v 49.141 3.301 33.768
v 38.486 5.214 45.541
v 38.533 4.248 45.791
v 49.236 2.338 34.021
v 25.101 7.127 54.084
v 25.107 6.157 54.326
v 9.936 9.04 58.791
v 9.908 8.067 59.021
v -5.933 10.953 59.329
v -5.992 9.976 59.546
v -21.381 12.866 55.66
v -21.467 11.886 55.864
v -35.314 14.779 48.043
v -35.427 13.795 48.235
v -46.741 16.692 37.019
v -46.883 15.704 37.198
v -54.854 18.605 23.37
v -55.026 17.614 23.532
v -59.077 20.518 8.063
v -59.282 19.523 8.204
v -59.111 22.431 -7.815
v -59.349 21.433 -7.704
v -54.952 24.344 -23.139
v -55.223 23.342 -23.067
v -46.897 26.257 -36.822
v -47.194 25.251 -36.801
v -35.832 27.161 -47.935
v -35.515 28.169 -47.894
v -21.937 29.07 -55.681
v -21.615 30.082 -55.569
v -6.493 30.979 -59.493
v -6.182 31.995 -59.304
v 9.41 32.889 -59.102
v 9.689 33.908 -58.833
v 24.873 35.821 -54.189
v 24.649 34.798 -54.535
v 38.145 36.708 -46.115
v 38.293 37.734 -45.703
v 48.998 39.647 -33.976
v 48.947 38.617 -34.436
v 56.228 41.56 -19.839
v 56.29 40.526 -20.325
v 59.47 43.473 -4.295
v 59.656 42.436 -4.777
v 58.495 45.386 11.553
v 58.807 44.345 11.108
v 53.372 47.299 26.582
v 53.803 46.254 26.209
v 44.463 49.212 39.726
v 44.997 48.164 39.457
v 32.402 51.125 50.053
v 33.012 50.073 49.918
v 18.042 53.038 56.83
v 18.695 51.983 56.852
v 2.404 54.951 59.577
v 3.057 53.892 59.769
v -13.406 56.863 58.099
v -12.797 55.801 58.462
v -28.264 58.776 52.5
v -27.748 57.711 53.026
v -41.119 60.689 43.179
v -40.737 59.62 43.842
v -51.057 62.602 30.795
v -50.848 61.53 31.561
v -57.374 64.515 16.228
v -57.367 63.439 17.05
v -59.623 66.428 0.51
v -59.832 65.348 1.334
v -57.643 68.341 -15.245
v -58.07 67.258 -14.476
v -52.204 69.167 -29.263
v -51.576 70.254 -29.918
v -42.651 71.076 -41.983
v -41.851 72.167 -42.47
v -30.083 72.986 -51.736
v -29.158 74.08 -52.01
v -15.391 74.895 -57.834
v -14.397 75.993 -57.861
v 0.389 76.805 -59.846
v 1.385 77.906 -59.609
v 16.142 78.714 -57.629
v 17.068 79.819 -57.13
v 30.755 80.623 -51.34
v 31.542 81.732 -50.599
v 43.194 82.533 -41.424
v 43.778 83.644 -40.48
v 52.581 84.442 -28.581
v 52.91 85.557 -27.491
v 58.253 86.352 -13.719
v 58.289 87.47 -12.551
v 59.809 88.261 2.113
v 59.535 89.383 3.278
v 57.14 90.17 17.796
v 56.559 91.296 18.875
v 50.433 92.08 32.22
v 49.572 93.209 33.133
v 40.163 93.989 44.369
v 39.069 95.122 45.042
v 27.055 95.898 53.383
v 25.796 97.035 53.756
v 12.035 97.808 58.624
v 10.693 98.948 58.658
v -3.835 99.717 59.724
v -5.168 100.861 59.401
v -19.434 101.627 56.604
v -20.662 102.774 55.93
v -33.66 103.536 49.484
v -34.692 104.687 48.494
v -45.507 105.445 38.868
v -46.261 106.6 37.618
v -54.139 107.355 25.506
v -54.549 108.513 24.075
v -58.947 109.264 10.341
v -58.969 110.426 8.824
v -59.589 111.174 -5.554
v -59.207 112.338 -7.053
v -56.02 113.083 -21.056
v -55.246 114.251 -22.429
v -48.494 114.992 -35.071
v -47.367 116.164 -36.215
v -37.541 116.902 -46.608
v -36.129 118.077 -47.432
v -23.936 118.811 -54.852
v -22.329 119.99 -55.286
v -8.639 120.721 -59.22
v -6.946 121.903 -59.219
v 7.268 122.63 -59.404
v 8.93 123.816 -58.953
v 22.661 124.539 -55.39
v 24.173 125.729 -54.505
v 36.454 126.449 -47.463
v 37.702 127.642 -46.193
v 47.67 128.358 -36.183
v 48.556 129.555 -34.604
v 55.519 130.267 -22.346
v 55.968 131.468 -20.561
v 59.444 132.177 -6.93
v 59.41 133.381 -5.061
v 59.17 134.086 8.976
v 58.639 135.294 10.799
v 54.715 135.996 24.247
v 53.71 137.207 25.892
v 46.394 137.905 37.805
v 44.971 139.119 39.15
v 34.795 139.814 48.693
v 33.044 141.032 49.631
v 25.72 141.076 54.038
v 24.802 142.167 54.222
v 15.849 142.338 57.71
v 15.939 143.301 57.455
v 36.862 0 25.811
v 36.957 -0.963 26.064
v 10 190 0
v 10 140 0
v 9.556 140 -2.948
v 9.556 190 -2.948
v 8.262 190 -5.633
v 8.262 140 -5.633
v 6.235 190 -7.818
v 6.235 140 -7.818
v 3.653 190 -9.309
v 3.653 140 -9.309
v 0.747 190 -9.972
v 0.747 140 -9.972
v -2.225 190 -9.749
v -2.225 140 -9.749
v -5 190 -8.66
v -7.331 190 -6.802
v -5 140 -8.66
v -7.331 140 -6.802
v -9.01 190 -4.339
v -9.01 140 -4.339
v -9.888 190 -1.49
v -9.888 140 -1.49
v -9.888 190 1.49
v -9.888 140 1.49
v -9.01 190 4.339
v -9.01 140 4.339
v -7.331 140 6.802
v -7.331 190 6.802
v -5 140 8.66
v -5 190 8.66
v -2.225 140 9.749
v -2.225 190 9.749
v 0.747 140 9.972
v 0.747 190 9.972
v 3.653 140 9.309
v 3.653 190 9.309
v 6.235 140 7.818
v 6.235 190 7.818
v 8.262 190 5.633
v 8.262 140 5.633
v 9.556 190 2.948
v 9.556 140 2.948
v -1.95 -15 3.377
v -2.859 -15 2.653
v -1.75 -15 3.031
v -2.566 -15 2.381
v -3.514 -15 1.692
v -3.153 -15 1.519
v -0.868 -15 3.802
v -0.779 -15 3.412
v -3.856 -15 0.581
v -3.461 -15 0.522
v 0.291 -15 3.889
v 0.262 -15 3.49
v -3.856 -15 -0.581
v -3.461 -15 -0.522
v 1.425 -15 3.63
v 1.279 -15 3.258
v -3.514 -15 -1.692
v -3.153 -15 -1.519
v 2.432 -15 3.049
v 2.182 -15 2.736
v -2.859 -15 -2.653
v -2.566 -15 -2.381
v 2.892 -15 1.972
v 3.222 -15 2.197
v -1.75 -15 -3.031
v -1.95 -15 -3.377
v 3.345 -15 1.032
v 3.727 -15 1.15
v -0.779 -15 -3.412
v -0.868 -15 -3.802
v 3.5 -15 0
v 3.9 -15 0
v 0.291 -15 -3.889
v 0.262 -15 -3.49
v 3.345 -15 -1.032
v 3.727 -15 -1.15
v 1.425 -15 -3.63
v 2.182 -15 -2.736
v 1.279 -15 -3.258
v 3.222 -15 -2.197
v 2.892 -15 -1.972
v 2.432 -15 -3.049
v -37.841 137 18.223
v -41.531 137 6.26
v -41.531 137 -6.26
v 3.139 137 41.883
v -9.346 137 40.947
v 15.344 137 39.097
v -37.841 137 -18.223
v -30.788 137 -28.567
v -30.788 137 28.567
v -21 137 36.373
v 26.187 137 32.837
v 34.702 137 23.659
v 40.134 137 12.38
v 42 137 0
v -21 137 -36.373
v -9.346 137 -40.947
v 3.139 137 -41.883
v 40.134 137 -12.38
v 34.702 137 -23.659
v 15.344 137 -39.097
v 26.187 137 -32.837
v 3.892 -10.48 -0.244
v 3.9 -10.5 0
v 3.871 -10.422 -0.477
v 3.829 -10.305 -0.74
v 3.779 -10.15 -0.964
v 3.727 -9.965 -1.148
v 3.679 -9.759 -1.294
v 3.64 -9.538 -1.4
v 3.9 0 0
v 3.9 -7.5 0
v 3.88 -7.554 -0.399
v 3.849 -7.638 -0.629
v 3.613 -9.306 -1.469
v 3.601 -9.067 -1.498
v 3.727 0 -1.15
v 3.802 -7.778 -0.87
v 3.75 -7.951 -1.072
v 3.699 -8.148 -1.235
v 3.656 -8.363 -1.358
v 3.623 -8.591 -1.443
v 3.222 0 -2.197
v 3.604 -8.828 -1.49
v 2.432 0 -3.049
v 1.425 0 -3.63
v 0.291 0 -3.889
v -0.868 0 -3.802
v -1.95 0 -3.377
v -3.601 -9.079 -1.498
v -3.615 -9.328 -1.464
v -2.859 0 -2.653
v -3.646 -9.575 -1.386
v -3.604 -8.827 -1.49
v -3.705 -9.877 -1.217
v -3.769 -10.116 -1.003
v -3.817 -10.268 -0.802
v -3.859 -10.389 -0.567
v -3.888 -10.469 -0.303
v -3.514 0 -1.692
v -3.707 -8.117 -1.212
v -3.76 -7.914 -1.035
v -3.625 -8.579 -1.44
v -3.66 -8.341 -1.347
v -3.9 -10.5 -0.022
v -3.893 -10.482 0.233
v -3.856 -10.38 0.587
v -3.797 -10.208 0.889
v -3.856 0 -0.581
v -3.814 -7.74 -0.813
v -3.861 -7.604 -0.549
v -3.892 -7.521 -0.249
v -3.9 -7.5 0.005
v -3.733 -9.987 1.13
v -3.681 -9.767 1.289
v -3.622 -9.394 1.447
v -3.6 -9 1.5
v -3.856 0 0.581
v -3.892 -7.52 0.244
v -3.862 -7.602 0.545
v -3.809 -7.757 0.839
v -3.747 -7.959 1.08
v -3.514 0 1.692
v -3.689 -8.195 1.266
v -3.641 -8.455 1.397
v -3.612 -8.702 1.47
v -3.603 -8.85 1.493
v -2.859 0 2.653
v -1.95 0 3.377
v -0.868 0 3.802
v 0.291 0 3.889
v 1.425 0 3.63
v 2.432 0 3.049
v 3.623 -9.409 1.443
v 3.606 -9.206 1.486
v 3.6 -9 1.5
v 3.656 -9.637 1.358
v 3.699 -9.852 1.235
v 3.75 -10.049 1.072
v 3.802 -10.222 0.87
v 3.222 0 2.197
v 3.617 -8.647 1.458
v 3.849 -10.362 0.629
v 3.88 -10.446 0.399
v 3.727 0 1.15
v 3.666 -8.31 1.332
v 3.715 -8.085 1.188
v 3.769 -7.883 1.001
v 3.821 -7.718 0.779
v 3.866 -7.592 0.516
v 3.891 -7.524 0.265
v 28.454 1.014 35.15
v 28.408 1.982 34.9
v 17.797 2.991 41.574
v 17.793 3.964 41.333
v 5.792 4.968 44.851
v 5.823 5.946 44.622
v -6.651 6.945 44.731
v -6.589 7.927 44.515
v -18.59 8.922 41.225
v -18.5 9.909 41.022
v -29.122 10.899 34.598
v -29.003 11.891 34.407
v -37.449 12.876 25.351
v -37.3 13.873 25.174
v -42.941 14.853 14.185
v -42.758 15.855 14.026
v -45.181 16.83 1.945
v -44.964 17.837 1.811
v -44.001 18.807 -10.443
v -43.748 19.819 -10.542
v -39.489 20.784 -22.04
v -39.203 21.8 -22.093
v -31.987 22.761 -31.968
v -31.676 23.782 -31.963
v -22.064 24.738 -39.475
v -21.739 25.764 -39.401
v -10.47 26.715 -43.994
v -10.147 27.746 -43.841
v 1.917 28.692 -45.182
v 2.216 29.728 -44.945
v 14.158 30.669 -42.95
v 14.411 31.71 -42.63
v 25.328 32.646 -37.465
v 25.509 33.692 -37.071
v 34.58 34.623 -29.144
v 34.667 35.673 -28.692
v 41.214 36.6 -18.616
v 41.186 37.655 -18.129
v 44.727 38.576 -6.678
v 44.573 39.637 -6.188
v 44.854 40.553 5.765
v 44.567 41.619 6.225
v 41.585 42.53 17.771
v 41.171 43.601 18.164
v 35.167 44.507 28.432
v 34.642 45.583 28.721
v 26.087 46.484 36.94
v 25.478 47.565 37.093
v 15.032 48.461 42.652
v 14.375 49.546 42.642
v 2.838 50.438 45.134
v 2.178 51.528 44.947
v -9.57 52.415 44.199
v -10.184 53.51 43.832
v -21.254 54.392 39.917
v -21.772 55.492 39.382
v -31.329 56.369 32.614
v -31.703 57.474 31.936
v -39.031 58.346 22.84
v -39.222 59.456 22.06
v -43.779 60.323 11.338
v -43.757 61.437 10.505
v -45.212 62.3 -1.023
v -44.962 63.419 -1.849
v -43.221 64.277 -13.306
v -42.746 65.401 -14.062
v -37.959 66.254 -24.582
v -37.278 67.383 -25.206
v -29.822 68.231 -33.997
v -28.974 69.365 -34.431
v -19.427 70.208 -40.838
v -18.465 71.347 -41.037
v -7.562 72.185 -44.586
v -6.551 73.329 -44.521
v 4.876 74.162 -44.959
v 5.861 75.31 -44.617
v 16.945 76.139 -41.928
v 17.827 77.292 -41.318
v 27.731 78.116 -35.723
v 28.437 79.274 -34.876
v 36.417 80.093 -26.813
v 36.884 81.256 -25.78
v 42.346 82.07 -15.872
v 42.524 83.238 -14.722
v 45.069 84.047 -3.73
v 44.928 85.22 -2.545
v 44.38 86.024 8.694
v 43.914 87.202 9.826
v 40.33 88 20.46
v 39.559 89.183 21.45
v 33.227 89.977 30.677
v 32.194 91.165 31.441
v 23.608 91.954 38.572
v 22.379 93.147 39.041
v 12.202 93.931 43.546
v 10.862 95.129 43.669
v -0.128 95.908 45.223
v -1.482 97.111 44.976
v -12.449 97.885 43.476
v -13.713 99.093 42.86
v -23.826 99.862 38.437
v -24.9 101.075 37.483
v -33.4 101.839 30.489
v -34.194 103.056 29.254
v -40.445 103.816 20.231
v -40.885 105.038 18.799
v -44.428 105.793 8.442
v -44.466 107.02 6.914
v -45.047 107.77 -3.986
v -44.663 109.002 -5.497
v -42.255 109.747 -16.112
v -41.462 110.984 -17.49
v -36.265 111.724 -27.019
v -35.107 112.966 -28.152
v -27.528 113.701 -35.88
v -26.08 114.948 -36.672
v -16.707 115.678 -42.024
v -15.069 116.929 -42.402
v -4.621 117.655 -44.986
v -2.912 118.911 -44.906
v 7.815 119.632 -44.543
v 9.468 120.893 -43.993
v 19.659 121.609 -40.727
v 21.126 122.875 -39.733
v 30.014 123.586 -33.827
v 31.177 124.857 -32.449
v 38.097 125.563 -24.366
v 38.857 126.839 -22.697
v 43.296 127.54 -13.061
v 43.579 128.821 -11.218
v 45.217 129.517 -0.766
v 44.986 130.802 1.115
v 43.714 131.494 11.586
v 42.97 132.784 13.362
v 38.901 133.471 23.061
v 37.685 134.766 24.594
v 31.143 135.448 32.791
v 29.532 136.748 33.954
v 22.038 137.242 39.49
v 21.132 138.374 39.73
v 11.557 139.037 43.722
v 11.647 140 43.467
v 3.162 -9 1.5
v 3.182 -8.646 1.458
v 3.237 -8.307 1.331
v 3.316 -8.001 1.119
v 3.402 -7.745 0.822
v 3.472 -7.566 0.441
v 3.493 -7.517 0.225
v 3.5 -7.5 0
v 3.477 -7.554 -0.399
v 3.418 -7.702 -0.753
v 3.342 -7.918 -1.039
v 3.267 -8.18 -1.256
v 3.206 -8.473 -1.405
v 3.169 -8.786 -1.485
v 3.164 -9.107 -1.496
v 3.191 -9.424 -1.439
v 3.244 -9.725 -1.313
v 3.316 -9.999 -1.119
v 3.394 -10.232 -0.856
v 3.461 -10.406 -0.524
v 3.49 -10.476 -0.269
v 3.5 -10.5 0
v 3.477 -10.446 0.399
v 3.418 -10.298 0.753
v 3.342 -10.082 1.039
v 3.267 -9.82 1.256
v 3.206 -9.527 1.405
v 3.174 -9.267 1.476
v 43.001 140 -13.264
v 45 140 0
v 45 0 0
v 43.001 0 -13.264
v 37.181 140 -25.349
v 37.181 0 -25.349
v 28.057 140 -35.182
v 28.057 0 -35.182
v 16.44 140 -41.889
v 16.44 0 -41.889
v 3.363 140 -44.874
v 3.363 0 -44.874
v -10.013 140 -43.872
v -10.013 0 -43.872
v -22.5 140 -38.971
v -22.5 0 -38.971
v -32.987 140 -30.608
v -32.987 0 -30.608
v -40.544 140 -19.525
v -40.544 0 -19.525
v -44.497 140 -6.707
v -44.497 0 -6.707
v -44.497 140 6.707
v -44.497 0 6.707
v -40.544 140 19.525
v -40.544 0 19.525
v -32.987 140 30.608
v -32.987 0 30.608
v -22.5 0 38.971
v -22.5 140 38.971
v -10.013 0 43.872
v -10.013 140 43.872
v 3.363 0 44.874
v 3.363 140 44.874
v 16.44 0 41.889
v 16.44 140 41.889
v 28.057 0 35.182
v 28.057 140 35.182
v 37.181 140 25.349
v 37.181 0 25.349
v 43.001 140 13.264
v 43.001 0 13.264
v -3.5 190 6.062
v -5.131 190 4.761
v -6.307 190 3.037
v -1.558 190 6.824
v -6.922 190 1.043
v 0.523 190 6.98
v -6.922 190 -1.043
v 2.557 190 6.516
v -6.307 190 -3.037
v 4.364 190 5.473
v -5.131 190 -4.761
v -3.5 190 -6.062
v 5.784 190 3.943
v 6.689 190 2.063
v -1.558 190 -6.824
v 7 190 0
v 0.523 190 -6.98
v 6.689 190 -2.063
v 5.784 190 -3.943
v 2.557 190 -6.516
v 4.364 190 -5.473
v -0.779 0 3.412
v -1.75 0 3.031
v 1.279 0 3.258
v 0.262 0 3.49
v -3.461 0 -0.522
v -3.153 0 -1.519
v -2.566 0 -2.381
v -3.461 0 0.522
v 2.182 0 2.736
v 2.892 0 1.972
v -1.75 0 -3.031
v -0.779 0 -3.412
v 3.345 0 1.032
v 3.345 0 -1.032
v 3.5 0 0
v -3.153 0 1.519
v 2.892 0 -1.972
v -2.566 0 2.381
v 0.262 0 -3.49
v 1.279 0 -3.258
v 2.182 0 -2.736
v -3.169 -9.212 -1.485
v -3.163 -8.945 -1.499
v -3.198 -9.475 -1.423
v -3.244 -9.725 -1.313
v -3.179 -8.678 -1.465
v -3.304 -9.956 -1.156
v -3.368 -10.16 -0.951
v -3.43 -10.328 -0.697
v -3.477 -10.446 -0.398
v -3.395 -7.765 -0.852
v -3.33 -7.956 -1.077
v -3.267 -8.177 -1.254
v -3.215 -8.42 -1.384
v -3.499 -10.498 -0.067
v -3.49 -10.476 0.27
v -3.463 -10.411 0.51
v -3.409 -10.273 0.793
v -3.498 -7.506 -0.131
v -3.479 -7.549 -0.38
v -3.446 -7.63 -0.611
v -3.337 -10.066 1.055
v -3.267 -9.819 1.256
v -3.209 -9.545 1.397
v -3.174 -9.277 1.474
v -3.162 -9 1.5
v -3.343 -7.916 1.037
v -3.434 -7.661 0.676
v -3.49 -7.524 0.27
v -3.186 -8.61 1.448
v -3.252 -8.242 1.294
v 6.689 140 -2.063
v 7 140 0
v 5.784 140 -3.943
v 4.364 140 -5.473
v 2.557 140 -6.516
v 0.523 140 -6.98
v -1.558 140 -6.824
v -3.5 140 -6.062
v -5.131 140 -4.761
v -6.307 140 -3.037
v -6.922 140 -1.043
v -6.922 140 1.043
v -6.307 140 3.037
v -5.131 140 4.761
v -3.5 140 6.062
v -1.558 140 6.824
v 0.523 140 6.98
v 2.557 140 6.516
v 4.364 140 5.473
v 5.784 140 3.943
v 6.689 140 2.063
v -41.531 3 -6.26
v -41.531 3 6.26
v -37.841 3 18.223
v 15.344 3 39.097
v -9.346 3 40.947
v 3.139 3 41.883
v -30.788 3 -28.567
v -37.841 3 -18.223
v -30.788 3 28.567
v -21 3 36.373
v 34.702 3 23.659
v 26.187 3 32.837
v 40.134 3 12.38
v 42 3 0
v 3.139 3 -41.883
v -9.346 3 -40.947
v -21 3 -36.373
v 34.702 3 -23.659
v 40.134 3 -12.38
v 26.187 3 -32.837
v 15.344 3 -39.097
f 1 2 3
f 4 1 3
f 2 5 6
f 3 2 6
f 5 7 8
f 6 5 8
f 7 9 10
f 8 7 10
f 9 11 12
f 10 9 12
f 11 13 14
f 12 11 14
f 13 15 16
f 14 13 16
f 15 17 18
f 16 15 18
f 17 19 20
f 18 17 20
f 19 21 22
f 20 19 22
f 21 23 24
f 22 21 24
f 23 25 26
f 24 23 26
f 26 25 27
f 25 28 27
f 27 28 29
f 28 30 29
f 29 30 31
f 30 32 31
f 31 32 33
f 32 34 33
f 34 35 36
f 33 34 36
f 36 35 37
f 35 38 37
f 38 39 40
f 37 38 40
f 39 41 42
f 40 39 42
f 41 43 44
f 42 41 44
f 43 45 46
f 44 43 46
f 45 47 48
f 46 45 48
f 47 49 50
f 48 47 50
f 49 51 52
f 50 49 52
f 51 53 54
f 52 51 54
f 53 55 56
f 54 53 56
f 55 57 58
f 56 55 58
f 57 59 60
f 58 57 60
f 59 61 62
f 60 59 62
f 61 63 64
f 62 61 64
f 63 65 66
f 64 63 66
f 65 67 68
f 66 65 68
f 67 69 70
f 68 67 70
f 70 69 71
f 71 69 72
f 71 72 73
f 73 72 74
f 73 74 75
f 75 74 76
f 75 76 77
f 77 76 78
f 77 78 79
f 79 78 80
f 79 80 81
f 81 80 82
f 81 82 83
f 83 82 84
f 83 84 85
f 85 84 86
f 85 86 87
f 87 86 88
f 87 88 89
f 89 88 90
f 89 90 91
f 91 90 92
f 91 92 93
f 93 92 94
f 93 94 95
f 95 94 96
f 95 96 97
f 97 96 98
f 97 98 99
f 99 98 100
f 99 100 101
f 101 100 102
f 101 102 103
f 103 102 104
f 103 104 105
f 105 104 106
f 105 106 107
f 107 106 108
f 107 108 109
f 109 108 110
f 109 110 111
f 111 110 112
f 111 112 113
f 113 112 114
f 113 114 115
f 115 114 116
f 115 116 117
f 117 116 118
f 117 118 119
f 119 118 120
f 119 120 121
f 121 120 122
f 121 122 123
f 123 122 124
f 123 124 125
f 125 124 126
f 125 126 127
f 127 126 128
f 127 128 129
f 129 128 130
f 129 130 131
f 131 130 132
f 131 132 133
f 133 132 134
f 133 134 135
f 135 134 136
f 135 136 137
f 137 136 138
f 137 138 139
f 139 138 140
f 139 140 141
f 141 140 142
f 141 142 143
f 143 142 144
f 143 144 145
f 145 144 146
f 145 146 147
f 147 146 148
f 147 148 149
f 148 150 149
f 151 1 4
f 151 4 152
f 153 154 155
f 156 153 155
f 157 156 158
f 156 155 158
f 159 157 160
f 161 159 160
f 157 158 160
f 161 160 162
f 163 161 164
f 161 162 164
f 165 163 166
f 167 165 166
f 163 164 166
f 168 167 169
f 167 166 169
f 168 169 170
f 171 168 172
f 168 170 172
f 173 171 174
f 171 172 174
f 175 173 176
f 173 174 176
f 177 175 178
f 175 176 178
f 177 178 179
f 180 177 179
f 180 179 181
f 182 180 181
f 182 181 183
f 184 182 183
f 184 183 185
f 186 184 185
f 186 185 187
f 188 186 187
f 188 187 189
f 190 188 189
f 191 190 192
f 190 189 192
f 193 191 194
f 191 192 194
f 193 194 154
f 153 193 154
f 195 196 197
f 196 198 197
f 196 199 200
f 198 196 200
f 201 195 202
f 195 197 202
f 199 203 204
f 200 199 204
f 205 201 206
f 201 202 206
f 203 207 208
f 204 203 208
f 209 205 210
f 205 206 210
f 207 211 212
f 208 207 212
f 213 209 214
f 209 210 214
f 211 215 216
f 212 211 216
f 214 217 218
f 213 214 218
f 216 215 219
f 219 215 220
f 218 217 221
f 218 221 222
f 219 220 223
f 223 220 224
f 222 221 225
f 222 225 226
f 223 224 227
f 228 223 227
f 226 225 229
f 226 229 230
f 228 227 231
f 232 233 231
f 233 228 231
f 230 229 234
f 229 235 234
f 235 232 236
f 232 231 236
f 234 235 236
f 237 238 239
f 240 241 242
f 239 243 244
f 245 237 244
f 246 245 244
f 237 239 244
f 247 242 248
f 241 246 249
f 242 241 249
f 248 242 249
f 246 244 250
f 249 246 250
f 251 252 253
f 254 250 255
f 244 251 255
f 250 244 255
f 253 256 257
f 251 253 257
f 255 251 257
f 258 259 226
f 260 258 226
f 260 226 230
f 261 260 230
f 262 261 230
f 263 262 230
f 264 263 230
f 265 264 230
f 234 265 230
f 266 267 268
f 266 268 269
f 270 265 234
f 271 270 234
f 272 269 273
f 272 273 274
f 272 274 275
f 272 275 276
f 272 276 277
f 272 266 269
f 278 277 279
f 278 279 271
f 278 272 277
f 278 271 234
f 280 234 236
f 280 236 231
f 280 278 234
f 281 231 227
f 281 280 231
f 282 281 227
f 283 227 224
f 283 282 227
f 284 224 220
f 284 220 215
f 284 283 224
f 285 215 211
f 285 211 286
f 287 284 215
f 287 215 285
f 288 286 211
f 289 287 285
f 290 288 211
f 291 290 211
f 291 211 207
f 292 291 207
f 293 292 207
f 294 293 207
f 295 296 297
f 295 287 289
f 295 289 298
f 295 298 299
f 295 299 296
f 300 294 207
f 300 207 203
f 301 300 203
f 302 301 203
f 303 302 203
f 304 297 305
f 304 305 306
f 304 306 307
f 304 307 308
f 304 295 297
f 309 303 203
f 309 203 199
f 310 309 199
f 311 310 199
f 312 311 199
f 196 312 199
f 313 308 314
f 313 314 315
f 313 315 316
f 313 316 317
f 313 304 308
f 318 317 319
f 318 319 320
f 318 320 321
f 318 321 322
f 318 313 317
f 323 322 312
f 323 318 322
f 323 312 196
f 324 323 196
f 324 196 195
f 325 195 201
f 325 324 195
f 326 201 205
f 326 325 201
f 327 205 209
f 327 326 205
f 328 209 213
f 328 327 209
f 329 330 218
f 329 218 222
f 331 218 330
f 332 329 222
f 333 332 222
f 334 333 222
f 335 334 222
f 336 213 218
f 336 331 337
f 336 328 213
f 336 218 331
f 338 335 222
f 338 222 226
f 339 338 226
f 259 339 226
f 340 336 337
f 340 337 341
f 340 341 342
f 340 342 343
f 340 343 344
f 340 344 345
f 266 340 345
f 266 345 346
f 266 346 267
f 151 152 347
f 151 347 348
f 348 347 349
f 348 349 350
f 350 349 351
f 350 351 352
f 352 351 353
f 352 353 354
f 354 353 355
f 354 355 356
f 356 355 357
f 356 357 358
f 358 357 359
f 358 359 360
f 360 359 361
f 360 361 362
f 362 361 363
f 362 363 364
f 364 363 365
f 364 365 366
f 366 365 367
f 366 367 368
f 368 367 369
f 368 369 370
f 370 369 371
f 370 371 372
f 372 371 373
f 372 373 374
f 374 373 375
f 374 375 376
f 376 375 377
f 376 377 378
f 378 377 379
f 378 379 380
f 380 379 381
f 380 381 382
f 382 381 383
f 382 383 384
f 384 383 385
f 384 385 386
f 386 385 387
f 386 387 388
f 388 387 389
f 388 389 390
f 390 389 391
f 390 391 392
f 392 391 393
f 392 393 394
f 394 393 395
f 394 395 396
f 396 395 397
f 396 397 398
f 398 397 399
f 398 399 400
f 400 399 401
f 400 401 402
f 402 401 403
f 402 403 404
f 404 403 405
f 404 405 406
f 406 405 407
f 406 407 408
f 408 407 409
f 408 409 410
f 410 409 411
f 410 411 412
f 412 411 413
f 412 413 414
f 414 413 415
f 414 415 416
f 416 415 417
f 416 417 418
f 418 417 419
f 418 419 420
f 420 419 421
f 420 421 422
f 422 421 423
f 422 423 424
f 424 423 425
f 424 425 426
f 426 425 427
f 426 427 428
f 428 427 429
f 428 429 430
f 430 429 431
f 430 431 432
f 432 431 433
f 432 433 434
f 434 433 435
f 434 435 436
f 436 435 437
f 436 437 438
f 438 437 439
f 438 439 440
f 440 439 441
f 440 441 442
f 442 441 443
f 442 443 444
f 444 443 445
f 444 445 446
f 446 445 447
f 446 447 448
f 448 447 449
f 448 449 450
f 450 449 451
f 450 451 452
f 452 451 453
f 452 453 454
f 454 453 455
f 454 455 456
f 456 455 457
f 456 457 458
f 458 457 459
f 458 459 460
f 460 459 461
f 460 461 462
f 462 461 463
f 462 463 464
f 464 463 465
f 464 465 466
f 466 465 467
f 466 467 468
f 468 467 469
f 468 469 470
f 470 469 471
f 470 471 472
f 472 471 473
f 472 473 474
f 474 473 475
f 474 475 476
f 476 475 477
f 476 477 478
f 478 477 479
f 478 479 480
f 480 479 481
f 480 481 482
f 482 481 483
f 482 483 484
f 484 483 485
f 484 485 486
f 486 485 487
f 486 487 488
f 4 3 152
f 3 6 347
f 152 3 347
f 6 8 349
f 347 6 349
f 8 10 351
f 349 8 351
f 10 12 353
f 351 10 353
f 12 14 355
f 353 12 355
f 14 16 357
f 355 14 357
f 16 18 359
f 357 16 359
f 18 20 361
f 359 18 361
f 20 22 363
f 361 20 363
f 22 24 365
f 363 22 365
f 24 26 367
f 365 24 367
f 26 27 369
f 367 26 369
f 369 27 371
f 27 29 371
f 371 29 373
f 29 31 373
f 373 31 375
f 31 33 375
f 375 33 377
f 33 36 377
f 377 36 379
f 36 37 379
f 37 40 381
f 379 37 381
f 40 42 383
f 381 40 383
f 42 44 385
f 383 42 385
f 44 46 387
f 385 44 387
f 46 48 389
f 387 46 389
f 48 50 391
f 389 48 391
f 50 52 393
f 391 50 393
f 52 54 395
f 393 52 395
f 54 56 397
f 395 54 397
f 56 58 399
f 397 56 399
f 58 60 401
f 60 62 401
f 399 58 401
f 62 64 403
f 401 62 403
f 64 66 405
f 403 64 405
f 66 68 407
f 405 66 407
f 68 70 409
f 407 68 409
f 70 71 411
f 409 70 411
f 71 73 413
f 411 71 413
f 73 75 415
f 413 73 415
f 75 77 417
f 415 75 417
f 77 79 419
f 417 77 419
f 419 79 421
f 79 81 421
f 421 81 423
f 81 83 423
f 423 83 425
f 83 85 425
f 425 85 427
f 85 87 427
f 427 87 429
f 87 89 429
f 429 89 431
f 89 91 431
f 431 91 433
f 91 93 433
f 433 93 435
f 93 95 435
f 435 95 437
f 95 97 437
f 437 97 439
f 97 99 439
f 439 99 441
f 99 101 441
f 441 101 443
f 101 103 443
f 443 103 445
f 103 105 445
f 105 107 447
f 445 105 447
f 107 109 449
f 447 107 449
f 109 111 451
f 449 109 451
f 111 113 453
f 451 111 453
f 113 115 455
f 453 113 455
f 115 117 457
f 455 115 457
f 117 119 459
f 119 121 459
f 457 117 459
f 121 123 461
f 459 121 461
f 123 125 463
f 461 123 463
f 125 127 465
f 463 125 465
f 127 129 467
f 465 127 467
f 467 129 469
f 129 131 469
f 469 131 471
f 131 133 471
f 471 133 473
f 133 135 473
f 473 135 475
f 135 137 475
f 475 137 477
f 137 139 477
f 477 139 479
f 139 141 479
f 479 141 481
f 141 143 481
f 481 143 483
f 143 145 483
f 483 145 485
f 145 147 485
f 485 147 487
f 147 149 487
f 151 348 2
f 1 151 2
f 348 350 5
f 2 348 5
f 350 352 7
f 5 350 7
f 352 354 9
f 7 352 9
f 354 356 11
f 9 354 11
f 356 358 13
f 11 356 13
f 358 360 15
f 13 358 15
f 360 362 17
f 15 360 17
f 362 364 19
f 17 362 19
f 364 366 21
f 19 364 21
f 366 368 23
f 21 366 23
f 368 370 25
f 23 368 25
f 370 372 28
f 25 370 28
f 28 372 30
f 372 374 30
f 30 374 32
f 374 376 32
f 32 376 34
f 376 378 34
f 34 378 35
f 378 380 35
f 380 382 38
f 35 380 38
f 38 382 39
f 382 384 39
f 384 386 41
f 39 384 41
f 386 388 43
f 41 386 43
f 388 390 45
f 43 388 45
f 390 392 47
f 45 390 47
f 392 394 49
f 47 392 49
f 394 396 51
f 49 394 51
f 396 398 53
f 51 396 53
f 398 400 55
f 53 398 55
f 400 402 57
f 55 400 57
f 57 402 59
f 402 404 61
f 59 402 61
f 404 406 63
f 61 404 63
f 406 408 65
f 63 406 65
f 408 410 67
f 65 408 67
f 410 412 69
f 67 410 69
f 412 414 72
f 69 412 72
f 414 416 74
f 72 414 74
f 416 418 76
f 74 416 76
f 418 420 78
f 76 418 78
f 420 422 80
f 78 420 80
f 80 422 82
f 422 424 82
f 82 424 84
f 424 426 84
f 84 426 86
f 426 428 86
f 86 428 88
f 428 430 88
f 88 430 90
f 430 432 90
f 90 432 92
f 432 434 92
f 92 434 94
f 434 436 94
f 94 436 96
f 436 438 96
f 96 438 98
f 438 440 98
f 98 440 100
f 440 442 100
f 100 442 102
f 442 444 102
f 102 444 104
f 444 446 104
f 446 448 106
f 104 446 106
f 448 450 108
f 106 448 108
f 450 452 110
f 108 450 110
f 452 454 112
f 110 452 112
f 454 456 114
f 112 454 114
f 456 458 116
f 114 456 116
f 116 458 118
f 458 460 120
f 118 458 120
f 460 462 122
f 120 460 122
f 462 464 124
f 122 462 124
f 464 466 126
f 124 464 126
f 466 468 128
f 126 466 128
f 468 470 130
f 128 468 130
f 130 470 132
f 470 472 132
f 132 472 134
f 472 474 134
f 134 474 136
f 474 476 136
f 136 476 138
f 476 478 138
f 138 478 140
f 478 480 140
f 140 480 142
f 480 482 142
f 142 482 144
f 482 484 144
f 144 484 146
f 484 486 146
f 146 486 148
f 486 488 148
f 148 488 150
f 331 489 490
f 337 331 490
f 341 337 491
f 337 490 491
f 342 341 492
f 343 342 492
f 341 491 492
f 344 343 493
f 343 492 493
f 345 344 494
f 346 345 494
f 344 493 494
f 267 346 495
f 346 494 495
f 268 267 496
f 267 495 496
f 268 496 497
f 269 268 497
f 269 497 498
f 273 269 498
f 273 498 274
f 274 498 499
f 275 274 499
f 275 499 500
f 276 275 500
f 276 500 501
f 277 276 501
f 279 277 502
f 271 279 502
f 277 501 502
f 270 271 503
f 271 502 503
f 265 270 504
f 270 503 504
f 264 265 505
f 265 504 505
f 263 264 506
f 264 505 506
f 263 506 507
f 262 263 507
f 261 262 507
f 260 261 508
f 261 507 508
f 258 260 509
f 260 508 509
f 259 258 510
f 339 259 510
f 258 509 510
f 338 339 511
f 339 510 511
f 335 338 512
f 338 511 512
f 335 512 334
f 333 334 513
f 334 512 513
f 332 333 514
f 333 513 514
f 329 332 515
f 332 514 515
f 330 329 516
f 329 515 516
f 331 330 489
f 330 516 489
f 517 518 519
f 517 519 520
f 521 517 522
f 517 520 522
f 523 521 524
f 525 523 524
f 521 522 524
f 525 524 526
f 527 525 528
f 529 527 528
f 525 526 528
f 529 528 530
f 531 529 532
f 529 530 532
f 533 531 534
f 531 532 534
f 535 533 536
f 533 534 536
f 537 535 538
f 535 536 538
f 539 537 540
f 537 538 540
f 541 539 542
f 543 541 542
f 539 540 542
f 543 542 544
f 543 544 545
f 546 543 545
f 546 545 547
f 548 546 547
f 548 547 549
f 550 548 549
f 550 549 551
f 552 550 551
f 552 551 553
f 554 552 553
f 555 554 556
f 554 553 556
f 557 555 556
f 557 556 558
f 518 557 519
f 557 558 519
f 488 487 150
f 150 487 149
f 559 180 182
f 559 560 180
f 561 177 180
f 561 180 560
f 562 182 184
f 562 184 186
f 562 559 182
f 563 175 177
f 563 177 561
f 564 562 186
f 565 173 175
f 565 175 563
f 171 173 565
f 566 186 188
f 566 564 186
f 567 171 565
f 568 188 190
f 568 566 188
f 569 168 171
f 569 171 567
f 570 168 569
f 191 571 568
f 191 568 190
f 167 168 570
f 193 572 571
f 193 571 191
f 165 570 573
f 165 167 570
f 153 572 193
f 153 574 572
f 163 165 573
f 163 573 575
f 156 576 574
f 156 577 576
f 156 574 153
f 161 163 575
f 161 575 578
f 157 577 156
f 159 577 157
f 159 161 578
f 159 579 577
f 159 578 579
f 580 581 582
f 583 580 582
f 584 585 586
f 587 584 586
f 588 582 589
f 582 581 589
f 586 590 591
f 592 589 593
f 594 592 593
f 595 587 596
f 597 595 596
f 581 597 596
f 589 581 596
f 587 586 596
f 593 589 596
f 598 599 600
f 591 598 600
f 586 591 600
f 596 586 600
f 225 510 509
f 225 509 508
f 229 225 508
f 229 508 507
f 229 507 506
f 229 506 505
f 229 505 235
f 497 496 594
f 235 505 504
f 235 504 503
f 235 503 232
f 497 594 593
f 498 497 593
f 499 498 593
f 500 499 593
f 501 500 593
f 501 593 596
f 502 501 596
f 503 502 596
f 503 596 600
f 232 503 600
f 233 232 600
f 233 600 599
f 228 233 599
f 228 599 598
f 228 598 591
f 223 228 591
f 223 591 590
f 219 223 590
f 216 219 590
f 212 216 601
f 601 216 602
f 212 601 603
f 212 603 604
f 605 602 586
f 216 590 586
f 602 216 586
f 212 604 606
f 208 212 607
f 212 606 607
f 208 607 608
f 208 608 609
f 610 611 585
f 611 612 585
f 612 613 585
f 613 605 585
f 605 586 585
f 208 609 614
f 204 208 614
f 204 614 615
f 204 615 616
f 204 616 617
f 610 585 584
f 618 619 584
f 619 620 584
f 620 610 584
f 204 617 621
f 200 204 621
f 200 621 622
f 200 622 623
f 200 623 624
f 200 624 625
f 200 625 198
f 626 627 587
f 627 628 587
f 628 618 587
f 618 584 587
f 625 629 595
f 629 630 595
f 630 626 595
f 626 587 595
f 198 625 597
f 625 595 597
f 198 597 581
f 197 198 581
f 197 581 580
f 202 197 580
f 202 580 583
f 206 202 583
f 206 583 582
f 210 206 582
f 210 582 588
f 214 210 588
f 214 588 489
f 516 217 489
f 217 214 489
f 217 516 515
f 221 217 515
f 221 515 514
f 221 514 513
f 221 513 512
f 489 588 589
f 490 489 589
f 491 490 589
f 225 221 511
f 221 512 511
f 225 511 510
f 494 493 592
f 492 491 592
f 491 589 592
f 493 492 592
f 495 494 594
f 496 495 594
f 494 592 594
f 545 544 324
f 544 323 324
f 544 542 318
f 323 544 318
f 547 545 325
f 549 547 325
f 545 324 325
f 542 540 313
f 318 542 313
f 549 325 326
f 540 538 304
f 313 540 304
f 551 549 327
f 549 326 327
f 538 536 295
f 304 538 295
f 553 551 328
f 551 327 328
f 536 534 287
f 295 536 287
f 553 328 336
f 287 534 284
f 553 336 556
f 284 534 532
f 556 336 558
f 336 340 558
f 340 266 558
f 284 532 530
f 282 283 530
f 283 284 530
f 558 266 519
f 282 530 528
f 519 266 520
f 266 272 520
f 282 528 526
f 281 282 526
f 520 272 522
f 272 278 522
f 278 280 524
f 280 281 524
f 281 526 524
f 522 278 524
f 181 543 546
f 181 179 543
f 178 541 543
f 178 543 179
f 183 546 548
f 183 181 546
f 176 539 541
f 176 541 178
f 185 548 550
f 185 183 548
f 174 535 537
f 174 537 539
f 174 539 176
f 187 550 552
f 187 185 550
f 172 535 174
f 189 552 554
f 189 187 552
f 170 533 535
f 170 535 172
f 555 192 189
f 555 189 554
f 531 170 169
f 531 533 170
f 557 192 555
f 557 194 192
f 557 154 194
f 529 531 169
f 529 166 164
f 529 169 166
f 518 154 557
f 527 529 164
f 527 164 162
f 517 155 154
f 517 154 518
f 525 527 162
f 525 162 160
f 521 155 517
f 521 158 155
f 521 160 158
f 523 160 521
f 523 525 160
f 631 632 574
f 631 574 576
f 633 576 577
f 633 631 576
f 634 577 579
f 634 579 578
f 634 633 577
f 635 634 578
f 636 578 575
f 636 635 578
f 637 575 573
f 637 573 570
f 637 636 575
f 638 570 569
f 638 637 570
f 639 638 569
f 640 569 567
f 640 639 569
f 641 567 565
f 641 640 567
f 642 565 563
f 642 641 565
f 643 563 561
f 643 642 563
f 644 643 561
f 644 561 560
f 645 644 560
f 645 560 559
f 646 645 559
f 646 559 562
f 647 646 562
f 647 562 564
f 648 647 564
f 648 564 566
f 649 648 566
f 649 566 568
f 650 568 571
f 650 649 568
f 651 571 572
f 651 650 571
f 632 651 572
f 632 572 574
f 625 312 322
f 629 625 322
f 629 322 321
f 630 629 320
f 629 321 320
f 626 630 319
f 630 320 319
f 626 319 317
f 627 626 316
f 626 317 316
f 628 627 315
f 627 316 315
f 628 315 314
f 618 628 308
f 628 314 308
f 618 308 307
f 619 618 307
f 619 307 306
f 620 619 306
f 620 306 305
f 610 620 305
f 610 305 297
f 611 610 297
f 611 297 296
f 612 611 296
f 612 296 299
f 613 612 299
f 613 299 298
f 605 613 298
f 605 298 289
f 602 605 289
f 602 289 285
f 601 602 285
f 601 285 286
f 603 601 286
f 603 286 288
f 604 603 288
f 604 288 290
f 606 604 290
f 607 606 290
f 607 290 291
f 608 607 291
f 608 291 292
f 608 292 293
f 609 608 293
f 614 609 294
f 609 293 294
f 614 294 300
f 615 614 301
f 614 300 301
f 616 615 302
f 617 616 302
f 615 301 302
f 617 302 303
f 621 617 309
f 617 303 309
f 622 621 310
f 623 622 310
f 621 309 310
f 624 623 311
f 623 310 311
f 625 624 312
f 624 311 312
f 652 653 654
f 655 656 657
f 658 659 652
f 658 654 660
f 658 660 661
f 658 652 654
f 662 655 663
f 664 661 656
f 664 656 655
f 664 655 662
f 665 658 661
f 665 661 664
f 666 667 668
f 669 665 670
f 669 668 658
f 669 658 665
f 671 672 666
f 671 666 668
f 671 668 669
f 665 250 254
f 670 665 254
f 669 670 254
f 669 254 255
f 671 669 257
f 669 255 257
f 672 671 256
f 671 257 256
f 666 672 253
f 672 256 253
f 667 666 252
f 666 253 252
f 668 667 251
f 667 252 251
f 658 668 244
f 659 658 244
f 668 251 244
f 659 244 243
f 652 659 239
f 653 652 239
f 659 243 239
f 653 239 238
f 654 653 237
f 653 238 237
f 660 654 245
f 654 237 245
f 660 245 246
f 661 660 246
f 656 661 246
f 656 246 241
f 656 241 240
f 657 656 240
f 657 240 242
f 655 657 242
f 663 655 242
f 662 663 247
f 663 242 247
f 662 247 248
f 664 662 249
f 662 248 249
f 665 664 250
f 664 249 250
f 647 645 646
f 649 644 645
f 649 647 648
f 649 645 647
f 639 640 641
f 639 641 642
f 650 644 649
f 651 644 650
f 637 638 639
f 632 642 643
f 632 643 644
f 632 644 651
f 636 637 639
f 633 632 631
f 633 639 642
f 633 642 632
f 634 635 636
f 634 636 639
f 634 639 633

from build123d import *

# Parameters (mm, degrees)
SKETCH2_R               = 45
BOSS_EXTRUDE1_DEPTH     = 140
SWEEP2_PITCH            = 45
SWEEP2_HEIGHT           = 140
SWEEP2_RADIUS           = 45
SWEEP2_START_ANGLE      = 55
SKETCH7_W               = 15
SKETCH7_H               = 1
SKETCH9_R               = 3.9
SKETCH9_R_2             = 3.5
BOSS_EXTRUDE2_DEPTH     = 15
SKETCH10_R              = 10
SKETCH10_R_2            = 7
BOSS_EXTRUDE3_DEPTH     = 50
SKETCH19_R              = 42
CUT_EXTRUDE2_DEPTH      = 134
SKETCH20_R              = 1.5
CUT_EXTRUDE4_DEPTH      = 56.946827101
CUT_EXTRUDE4_DEPTH_BACK = 64.746830086


with BuildPart() as part:
    # Sketch2 → Boss-Extrude1 (new body)
    with BuildSketch(Plane(origin=(0, 0, 0), x_dir=(1, 0, 0), z_dir=(0, 1, 0))):
        Circle(SKETCH2_R)
    extrude(amount=BOSS_EXTRUDE1_DEPTH)

    # Sketch9 → Boss-Extrude2 (add)
    with BuildSketch(Plane(origin=(0, 0, 0), x_dir=(1, 0, 0), z_dir=(0, 1, 0))):
        Circle(SKETCH9_R)
        Circle(SKETCH9_R_2, mode=Mode.SUBTRACT)
    extrude(amount=-BOSS_EXTRUDE2_DEPTH)

    # Sketch10 → Boss-Extrude3 (add)
    with BuildSketch(Plane(origin=(0, 140, 0), x_dir=(1, 0, 0), z_dir=(0, 1, 0))):
        Circle(SKETCH10_R)
        Circle(SKETCH10_R_2, mode=Mode.SUBTRACT)
    extrude(amount=BOSS_EXTRUDE3_DEPTH)

    # Sketch19 → Cut-Extrude2 (cut)
    with BuildSketch(Plane(origin=(0, 137, 0), x_dir=(1, 0, 0), z_dir=(0, 1, 0))):
        Circle(SKETCH19_R)
    extrude(amount=-CUT_EXTRUDE2_DEPTH, mode=Mode.SUBTRACT)

    # Sketch20 → Cut-Extrude4 (cut, two sides)
    with BuildSketch(Plane.ZY.offset(3.9)) as cut_extrude4_sk:
        with Locations((0, -9)):
            Circle(SKETCH20_R)
    extrude(amount=CUT_EXTRUDE4_DEPTH, mode=Mode.SUBTRACT)
    extrude(cut_extrude4_sk.sketch, amount=-CUT_EXTRUDE4_DEPTH_BACK, mode=Mode.SUBTRACT)


with BuildPart() as body_2:
    # Sweep2: sweep along a helix
    with BuildLine() as sweep2_path:
        add(Helix(SWEEP2_PITCH, SWEEP2_HEIGHT, SWEEP2_RADIUS, center=(0, 0, 0), direction=(0, 1, 0), lefthand=True, mode=Mode.PRIVATE).rotate(Axis((0, 0, 0), (0, 1, 0)), SWEEP2_START_ANGLE))
    # Sketch7 → Sweep2 (sweep)
    with BuildSketch(Plane(origin=(11.64685703, 140, 43.466662183), x_dir=(-0.286143667, -0.220078885, -0.932570151), z_dir=(0.953919844, -0.157176725, -0.255602052))):
        with Locations((-7.5, -0.5)):
            Rectangle(SKETCH7_W, SKETCH7_H)
    sweep(path=sweep2_path.line, is_frenet=True)


solid = Compound([part.part, body_2.part])
